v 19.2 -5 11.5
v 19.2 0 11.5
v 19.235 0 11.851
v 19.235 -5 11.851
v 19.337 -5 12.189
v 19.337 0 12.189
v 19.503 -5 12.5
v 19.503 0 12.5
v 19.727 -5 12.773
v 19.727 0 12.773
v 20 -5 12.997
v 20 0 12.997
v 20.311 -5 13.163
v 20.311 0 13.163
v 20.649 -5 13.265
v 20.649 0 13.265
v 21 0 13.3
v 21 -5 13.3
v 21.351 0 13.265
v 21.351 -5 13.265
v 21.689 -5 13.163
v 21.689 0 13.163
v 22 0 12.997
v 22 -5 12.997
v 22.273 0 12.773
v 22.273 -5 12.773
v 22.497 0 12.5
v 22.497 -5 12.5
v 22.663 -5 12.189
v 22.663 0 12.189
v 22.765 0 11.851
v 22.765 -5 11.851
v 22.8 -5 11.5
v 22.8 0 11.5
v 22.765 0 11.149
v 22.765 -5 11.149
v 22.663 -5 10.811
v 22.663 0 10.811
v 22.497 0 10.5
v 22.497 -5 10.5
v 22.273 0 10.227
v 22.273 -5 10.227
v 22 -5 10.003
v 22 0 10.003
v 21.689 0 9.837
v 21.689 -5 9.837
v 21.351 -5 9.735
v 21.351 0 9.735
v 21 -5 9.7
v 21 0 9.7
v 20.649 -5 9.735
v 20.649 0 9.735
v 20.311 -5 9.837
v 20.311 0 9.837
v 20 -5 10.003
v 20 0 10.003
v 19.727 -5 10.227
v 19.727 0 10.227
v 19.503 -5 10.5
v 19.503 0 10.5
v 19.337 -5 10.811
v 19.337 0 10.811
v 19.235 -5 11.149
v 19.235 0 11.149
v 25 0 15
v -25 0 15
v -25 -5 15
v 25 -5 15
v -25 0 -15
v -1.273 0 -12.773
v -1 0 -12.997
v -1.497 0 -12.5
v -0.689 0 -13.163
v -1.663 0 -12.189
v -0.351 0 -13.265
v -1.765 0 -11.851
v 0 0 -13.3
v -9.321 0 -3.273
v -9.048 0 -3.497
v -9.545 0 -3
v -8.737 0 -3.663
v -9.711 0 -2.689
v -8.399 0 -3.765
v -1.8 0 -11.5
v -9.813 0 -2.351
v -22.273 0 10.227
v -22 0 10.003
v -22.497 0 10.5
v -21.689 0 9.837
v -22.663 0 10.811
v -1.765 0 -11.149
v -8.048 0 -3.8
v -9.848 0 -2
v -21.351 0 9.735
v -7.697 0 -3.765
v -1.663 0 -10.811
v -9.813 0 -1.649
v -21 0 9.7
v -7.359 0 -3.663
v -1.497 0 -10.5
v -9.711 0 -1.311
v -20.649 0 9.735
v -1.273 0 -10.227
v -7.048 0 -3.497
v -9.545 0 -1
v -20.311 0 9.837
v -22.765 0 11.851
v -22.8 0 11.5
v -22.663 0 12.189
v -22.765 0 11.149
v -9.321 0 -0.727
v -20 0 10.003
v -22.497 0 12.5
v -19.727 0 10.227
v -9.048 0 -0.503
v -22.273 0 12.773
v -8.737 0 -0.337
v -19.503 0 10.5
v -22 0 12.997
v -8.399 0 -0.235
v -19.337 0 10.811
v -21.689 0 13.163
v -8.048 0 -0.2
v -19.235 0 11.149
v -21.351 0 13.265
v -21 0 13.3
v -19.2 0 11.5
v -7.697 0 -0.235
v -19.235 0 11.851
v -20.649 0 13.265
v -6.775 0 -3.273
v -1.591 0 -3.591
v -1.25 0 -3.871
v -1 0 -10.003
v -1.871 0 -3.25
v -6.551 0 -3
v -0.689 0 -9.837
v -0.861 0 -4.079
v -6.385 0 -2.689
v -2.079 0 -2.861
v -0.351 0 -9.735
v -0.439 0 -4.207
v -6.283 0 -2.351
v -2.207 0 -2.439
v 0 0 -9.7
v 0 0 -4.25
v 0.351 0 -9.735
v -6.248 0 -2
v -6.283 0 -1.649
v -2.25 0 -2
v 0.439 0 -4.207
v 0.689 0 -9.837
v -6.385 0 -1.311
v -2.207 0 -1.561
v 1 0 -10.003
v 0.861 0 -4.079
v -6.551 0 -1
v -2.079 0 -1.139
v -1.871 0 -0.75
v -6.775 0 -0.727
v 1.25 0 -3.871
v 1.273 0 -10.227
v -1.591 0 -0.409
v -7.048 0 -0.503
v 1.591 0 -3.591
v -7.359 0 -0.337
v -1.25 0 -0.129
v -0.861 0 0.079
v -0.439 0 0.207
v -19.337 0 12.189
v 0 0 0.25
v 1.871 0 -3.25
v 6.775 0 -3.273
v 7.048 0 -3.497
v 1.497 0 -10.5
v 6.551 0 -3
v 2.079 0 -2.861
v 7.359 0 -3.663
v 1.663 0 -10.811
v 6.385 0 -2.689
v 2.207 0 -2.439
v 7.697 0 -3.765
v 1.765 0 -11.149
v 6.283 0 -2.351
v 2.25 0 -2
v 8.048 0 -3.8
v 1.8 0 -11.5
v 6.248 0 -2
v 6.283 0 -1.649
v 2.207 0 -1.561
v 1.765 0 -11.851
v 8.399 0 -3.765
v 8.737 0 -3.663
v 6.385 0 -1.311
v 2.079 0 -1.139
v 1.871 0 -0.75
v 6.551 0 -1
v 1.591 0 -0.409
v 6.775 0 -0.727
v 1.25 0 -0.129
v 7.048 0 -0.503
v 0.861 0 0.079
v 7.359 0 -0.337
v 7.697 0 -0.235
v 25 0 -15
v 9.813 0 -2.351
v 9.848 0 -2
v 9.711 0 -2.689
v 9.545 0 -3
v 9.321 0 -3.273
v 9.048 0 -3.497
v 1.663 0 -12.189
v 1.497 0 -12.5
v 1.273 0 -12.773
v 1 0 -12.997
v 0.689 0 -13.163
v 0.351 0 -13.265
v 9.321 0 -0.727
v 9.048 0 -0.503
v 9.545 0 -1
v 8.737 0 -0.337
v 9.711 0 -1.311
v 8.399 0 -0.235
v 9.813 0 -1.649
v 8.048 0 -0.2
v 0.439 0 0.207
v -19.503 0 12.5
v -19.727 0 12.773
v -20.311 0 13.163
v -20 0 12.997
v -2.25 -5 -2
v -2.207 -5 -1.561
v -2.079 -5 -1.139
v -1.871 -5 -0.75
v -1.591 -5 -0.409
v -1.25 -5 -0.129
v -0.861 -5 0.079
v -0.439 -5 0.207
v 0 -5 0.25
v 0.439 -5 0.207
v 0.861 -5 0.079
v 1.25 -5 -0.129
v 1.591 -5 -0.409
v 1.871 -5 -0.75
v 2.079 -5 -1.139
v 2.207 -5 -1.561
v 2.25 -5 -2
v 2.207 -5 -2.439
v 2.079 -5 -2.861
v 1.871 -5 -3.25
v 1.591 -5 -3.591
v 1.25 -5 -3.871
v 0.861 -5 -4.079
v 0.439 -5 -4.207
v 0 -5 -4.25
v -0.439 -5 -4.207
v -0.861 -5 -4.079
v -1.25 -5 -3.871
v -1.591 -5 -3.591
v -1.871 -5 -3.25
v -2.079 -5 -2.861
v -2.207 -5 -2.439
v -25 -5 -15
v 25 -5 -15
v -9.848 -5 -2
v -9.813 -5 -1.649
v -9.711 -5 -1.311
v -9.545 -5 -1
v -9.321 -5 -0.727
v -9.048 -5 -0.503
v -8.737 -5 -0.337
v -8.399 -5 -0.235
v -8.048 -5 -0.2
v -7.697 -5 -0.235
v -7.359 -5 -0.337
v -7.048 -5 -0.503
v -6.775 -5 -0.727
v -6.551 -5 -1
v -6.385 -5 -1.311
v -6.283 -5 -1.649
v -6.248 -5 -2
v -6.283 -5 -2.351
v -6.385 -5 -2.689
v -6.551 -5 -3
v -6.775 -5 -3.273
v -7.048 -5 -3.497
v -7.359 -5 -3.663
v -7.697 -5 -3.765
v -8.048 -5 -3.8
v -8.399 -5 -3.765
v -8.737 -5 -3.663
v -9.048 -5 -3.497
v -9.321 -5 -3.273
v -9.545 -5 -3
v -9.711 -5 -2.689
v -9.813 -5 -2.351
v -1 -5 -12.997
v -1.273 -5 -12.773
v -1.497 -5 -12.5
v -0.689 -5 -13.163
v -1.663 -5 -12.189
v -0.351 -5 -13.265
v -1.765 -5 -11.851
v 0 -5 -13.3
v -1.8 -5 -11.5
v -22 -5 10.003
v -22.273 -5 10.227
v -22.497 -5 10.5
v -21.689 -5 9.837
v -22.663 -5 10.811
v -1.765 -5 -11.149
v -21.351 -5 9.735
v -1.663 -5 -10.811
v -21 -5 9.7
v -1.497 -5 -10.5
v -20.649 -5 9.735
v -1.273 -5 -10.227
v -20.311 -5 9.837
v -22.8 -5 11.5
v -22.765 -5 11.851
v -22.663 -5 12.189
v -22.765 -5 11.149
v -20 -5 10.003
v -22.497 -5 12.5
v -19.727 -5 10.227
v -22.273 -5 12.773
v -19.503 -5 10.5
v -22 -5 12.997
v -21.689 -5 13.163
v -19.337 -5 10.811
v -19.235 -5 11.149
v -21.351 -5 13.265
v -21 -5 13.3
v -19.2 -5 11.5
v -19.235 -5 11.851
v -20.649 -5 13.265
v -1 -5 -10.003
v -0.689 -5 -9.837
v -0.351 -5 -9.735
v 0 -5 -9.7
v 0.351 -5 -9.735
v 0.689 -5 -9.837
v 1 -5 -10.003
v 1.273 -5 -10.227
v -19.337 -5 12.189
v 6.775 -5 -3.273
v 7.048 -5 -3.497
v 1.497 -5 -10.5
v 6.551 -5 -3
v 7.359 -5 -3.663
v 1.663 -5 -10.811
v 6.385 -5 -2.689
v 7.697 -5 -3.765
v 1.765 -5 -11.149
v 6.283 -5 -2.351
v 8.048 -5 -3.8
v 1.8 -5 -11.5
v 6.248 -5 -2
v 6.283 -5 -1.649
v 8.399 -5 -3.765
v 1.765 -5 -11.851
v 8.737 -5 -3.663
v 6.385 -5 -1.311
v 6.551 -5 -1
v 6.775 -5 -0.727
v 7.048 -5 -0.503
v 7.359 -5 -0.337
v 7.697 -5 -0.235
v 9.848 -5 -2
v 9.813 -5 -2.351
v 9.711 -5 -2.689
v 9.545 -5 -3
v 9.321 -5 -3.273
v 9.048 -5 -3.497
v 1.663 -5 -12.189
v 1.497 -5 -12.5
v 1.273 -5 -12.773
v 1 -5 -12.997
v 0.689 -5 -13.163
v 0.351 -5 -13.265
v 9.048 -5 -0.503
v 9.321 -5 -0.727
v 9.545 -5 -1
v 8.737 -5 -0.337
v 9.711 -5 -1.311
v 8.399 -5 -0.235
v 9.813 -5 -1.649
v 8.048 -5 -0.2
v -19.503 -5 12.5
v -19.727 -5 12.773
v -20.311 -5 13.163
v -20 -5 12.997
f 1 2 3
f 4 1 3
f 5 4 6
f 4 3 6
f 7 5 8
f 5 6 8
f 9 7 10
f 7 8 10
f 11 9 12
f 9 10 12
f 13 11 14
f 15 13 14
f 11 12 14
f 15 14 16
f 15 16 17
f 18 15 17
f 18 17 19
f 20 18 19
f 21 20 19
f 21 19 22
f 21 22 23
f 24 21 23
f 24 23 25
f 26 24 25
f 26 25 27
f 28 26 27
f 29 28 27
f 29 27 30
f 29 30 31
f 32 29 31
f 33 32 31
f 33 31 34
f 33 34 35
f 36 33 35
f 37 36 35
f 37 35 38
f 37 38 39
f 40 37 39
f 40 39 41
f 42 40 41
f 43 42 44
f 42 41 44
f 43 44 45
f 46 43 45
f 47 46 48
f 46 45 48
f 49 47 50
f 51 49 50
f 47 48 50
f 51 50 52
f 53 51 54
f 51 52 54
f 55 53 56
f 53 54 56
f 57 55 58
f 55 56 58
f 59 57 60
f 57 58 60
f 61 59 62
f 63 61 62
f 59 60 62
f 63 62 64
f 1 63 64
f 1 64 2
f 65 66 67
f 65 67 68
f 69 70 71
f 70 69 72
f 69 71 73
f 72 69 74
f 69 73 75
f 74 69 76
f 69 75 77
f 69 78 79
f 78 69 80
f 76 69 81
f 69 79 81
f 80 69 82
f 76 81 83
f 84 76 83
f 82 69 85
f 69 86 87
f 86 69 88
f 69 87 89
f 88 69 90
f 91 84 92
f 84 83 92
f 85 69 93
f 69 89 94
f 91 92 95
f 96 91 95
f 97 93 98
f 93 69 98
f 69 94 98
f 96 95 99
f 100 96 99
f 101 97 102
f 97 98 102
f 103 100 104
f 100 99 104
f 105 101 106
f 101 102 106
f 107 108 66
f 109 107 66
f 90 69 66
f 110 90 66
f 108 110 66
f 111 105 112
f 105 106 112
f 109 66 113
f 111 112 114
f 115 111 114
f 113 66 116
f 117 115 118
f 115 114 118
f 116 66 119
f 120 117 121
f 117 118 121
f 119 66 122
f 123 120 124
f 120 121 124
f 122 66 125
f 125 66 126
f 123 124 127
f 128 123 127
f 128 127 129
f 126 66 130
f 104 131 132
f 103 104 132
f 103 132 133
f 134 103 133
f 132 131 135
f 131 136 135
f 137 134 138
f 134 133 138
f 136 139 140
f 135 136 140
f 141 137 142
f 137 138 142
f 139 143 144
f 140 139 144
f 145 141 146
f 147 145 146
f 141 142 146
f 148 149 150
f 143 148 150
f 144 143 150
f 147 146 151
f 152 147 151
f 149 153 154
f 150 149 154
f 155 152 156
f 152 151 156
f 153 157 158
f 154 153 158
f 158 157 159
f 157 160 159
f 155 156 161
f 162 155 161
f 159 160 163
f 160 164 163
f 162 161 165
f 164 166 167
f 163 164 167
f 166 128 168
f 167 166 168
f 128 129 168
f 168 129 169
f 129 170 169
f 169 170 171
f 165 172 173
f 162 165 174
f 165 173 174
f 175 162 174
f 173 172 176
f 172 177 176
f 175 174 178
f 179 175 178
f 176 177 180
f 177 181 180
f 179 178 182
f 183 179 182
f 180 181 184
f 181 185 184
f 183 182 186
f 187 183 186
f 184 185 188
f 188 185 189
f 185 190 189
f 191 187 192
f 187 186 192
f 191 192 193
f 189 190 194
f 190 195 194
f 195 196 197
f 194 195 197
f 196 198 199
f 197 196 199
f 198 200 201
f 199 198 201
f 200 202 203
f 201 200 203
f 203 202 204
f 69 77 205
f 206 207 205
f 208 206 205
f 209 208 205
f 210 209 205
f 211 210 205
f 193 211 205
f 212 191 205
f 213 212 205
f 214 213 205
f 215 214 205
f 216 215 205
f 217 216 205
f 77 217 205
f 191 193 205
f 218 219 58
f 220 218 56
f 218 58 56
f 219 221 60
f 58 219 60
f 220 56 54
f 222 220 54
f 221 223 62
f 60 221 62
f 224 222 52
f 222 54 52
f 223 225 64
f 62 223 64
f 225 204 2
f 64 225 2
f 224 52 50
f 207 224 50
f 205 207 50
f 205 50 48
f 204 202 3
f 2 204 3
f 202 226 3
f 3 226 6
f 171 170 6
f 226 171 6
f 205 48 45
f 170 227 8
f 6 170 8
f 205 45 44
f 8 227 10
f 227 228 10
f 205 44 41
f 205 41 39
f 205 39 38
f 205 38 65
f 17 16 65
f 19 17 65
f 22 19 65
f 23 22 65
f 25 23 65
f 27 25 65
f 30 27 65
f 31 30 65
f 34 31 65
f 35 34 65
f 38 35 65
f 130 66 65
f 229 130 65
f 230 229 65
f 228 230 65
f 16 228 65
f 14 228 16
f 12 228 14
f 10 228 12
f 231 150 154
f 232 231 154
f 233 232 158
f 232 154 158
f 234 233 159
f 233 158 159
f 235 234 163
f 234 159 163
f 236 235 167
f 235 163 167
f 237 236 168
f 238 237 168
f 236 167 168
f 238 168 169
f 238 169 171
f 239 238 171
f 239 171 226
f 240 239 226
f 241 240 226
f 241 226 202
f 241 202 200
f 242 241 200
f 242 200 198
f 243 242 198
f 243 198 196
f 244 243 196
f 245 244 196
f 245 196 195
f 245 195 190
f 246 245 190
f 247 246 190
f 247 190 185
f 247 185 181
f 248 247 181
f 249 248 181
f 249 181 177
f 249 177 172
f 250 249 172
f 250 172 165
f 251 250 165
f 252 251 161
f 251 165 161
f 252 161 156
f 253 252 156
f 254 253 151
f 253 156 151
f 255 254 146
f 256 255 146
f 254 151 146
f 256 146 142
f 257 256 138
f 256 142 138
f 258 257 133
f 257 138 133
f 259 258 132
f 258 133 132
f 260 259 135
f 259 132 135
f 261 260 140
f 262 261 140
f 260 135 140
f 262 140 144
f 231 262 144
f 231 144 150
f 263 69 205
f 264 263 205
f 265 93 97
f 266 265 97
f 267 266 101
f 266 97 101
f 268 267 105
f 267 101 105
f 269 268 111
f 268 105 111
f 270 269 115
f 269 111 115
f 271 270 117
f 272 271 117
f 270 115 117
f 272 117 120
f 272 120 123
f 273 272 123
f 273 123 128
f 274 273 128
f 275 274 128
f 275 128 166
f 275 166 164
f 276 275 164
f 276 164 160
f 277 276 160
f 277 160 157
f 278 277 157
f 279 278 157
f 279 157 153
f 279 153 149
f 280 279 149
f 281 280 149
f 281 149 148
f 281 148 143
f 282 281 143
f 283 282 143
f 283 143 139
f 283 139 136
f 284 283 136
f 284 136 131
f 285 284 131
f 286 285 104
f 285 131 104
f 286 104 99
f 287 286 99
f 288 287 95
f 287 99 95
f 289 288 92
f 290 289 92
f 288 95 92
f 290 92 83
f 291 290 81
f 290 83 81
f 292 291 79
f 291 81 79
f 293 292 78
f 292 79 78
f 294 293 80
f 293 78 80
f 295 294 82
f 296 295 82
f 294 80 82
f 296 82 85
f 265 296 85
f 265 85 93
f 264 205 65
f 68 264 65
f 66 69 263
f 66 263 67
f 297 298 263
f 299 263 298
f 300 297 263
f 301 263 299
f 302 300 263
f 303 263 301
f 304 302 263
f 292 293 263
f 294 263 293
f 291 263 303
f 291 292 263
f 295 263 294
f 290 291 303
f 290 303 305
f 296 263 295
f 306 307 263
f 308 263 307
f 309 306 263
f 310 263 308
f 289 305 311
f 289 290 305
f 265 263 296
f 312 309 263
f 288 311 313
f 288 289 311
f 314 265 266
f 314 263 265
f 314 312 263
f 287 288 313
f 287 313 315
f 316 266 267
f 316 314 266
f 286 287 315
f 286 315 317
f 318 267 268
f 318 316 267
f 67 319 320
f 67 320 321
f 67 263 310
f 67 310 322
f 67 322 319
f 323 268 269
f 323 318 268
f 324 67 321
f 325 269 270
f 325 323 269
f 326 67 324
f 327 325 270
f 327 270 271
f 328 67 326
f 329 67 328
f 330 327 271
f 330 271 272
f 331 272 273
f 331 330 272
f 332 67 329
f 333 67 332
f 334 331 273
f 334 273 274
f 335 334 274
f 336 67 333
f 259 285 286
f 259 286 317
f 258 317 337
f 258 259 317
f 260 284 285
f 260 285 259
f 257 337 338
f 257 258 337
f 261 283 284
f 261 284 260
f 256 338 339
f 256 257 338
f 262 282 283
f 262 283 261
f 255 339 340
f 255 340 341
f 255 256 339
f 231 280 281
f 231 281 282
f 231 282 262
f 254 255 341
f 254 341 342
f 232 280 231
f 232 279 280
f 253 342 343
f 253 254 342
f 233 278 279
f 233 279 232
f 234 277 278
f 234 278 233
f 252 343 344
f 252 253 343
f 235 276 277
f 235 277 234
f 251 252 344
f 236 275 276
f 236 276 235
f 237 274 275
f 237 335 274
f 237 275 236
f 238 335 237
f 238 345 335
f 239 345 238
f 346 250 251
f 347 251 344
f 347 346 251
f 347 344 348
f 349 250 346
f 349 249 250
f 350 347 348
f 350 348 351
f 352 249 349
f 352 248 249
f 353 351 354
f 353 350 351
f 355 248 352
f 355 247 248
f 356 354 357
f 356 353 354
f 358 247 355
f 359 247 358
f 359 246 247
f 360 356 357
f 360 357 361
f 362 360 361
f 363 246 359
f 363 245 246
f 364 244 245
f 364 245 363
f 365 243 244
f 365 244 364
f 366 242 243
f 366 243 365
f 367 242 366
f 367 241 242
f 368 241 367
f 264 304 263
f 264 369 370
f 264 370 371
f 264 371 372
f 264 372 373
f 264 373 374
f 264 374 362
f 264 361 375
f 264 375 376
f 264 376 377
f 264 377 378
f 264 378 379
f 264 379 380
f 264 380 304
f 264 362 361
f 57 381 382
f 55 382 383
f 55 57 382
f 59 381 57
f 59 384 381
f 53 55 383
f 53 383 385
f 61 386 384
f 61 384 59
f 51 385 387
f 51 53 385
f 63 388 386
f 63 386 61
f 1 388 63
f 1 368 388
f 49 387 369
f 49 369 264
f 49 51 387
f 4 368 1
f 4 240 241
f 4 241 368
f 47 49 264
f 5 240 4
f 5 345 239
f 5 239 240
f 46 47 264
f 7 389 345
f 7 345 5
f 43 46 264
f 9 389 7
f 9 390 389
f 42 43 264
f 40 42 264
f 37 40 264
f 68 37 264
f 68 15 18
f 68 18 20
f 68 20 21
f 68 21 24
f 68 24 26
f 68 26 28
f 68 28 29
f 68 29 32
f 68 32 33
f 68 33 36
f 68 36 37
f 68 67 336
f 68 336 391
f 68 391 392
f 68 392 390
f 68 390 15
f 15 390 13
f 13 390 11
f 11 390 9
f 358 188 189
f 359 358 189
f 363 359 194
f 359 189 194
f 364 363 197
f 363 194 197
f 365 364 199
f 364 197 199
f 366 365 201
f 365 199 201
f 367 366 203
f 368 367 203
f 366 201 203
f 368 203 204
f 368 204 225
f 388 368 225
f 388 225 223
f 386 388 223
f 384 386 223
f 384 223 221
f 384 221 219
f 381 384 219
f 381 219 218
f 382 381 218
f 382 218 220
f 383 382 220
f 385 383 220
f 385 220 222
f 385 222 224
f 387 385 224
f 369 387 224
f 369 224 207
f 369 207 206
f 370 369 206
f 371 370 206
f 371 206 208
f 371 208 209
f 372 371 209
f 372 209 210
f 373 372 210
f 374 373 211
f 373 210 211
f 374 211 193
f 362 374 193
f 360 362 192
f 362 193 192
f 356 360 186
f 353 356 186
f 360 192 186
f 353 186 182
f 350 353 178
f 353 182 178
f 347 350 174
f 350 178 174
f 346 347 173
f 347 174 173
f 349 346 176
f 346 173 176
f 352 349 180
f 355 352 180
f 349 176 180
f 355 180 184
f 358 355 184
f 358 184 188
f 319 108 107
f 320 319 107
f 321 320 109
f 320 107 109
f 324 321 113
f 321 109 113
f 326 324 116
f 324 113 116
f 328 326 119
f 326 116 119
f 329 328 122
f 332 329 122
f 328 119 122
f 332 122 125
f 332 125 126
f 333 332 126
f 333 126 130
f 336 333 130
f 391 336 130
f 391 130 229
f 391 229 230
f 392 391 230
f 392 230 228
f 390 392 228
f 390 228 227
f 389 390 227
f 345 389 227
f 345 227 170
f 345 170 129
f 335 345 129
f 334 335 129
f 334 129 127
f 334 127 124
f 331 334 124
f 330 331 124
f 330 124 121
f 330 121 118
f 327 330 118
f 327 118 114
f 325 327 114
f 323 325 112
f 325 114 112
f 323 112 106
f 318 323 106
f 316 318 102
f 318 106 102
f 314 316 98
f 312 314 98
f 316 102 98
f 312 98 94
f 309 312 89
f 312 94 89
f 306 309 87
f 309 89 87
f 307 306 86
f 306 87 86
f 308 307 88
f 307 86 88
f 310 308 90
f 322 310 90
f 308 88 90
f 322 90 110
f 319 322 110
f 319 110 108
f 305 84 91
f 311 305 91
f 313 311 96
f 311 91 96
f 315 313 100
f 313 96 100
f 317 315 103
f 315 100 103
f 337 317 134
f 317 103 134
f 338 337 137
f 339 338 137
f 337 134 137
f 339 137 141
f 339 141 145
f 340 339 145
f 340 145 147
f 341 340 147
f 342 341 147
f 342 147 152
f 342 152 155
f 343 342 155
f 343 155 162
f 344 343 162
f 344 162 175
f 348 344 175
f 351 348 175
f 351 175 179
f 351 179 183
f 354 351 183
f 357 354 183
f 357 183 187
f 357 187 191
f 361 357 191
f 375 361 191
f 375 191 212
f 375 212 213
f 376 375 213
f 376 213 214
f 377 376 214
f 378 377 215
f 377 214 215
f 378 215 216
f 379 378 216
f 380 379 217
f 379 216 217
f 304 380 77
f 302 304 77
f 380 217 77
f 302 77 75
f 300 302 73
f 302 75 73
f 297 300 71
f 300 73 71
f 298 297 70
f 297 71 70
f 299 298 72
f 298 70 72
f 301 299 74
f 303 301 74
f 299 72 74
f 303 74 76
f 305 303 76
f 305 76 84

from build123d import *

# Parameters (mm, degrees)
F0_W     = 50
F0_H     = 30
F1_DEPTH = 5
F2_R     = 1.8
F3_DEPTH = 5.001
F4_R     = 1.8
F4_R_2   = 2.25
F5_DEPTH = 5.001
F6_R     = 1.8
F7_DEPTH = 5.001


with BuildPart() as f1:
    # F0 (on Front) → F1 (new body)
    with BuildSketch(Plane.XZ):
        Rectangle(F0_W, F0_H)
    extrude(amount=F1_DEPTH)

    # F2 (on face) → F3 (cut, through all)
    with BuildSketch(Plane(origin=(0, 0, 0), x_dir=(-1, 0, 0), z_dir=(0, 1, 0))):
        with Locations((0, -11.5)):
            Circle(F2_R)
    extrude(amount=-F3_DEPTH, mode=Mode.SUBTRACT)

    # F4 (on face) → F5 (cut, through all)
    with BuildSketch(Plane(origin=(0, 0, 0), x_dir=(-1, 0, 0), z_dir=(0, 1, 0))):
        with Locations((8.048, -2)):
            Circle(F4_R)
        with Locations((0, -2)):
            Circle(F4_R_2)
        with Locations((-8.048, -2)):
            Circle(F4_R)
    extrude(amount=-F5_DEPTH, mode=Mode.SUBTRACT)

    # F6 (on face) → F7 (cut, through all)
    with BuildSketch(Plane(origin=(0, 0, 0), x_dir=(-1, 0, 0), z_dir=(0, 1, 0))):
        with Locations((-21, 11.5)):
            Circle(F6_R)
        with Locations((21, 11.5)):
            Circle(F6_R)
    extrude(amount=-F7_DEPTH, mode=Mode.SUBTRACT)


solid = f1.part
